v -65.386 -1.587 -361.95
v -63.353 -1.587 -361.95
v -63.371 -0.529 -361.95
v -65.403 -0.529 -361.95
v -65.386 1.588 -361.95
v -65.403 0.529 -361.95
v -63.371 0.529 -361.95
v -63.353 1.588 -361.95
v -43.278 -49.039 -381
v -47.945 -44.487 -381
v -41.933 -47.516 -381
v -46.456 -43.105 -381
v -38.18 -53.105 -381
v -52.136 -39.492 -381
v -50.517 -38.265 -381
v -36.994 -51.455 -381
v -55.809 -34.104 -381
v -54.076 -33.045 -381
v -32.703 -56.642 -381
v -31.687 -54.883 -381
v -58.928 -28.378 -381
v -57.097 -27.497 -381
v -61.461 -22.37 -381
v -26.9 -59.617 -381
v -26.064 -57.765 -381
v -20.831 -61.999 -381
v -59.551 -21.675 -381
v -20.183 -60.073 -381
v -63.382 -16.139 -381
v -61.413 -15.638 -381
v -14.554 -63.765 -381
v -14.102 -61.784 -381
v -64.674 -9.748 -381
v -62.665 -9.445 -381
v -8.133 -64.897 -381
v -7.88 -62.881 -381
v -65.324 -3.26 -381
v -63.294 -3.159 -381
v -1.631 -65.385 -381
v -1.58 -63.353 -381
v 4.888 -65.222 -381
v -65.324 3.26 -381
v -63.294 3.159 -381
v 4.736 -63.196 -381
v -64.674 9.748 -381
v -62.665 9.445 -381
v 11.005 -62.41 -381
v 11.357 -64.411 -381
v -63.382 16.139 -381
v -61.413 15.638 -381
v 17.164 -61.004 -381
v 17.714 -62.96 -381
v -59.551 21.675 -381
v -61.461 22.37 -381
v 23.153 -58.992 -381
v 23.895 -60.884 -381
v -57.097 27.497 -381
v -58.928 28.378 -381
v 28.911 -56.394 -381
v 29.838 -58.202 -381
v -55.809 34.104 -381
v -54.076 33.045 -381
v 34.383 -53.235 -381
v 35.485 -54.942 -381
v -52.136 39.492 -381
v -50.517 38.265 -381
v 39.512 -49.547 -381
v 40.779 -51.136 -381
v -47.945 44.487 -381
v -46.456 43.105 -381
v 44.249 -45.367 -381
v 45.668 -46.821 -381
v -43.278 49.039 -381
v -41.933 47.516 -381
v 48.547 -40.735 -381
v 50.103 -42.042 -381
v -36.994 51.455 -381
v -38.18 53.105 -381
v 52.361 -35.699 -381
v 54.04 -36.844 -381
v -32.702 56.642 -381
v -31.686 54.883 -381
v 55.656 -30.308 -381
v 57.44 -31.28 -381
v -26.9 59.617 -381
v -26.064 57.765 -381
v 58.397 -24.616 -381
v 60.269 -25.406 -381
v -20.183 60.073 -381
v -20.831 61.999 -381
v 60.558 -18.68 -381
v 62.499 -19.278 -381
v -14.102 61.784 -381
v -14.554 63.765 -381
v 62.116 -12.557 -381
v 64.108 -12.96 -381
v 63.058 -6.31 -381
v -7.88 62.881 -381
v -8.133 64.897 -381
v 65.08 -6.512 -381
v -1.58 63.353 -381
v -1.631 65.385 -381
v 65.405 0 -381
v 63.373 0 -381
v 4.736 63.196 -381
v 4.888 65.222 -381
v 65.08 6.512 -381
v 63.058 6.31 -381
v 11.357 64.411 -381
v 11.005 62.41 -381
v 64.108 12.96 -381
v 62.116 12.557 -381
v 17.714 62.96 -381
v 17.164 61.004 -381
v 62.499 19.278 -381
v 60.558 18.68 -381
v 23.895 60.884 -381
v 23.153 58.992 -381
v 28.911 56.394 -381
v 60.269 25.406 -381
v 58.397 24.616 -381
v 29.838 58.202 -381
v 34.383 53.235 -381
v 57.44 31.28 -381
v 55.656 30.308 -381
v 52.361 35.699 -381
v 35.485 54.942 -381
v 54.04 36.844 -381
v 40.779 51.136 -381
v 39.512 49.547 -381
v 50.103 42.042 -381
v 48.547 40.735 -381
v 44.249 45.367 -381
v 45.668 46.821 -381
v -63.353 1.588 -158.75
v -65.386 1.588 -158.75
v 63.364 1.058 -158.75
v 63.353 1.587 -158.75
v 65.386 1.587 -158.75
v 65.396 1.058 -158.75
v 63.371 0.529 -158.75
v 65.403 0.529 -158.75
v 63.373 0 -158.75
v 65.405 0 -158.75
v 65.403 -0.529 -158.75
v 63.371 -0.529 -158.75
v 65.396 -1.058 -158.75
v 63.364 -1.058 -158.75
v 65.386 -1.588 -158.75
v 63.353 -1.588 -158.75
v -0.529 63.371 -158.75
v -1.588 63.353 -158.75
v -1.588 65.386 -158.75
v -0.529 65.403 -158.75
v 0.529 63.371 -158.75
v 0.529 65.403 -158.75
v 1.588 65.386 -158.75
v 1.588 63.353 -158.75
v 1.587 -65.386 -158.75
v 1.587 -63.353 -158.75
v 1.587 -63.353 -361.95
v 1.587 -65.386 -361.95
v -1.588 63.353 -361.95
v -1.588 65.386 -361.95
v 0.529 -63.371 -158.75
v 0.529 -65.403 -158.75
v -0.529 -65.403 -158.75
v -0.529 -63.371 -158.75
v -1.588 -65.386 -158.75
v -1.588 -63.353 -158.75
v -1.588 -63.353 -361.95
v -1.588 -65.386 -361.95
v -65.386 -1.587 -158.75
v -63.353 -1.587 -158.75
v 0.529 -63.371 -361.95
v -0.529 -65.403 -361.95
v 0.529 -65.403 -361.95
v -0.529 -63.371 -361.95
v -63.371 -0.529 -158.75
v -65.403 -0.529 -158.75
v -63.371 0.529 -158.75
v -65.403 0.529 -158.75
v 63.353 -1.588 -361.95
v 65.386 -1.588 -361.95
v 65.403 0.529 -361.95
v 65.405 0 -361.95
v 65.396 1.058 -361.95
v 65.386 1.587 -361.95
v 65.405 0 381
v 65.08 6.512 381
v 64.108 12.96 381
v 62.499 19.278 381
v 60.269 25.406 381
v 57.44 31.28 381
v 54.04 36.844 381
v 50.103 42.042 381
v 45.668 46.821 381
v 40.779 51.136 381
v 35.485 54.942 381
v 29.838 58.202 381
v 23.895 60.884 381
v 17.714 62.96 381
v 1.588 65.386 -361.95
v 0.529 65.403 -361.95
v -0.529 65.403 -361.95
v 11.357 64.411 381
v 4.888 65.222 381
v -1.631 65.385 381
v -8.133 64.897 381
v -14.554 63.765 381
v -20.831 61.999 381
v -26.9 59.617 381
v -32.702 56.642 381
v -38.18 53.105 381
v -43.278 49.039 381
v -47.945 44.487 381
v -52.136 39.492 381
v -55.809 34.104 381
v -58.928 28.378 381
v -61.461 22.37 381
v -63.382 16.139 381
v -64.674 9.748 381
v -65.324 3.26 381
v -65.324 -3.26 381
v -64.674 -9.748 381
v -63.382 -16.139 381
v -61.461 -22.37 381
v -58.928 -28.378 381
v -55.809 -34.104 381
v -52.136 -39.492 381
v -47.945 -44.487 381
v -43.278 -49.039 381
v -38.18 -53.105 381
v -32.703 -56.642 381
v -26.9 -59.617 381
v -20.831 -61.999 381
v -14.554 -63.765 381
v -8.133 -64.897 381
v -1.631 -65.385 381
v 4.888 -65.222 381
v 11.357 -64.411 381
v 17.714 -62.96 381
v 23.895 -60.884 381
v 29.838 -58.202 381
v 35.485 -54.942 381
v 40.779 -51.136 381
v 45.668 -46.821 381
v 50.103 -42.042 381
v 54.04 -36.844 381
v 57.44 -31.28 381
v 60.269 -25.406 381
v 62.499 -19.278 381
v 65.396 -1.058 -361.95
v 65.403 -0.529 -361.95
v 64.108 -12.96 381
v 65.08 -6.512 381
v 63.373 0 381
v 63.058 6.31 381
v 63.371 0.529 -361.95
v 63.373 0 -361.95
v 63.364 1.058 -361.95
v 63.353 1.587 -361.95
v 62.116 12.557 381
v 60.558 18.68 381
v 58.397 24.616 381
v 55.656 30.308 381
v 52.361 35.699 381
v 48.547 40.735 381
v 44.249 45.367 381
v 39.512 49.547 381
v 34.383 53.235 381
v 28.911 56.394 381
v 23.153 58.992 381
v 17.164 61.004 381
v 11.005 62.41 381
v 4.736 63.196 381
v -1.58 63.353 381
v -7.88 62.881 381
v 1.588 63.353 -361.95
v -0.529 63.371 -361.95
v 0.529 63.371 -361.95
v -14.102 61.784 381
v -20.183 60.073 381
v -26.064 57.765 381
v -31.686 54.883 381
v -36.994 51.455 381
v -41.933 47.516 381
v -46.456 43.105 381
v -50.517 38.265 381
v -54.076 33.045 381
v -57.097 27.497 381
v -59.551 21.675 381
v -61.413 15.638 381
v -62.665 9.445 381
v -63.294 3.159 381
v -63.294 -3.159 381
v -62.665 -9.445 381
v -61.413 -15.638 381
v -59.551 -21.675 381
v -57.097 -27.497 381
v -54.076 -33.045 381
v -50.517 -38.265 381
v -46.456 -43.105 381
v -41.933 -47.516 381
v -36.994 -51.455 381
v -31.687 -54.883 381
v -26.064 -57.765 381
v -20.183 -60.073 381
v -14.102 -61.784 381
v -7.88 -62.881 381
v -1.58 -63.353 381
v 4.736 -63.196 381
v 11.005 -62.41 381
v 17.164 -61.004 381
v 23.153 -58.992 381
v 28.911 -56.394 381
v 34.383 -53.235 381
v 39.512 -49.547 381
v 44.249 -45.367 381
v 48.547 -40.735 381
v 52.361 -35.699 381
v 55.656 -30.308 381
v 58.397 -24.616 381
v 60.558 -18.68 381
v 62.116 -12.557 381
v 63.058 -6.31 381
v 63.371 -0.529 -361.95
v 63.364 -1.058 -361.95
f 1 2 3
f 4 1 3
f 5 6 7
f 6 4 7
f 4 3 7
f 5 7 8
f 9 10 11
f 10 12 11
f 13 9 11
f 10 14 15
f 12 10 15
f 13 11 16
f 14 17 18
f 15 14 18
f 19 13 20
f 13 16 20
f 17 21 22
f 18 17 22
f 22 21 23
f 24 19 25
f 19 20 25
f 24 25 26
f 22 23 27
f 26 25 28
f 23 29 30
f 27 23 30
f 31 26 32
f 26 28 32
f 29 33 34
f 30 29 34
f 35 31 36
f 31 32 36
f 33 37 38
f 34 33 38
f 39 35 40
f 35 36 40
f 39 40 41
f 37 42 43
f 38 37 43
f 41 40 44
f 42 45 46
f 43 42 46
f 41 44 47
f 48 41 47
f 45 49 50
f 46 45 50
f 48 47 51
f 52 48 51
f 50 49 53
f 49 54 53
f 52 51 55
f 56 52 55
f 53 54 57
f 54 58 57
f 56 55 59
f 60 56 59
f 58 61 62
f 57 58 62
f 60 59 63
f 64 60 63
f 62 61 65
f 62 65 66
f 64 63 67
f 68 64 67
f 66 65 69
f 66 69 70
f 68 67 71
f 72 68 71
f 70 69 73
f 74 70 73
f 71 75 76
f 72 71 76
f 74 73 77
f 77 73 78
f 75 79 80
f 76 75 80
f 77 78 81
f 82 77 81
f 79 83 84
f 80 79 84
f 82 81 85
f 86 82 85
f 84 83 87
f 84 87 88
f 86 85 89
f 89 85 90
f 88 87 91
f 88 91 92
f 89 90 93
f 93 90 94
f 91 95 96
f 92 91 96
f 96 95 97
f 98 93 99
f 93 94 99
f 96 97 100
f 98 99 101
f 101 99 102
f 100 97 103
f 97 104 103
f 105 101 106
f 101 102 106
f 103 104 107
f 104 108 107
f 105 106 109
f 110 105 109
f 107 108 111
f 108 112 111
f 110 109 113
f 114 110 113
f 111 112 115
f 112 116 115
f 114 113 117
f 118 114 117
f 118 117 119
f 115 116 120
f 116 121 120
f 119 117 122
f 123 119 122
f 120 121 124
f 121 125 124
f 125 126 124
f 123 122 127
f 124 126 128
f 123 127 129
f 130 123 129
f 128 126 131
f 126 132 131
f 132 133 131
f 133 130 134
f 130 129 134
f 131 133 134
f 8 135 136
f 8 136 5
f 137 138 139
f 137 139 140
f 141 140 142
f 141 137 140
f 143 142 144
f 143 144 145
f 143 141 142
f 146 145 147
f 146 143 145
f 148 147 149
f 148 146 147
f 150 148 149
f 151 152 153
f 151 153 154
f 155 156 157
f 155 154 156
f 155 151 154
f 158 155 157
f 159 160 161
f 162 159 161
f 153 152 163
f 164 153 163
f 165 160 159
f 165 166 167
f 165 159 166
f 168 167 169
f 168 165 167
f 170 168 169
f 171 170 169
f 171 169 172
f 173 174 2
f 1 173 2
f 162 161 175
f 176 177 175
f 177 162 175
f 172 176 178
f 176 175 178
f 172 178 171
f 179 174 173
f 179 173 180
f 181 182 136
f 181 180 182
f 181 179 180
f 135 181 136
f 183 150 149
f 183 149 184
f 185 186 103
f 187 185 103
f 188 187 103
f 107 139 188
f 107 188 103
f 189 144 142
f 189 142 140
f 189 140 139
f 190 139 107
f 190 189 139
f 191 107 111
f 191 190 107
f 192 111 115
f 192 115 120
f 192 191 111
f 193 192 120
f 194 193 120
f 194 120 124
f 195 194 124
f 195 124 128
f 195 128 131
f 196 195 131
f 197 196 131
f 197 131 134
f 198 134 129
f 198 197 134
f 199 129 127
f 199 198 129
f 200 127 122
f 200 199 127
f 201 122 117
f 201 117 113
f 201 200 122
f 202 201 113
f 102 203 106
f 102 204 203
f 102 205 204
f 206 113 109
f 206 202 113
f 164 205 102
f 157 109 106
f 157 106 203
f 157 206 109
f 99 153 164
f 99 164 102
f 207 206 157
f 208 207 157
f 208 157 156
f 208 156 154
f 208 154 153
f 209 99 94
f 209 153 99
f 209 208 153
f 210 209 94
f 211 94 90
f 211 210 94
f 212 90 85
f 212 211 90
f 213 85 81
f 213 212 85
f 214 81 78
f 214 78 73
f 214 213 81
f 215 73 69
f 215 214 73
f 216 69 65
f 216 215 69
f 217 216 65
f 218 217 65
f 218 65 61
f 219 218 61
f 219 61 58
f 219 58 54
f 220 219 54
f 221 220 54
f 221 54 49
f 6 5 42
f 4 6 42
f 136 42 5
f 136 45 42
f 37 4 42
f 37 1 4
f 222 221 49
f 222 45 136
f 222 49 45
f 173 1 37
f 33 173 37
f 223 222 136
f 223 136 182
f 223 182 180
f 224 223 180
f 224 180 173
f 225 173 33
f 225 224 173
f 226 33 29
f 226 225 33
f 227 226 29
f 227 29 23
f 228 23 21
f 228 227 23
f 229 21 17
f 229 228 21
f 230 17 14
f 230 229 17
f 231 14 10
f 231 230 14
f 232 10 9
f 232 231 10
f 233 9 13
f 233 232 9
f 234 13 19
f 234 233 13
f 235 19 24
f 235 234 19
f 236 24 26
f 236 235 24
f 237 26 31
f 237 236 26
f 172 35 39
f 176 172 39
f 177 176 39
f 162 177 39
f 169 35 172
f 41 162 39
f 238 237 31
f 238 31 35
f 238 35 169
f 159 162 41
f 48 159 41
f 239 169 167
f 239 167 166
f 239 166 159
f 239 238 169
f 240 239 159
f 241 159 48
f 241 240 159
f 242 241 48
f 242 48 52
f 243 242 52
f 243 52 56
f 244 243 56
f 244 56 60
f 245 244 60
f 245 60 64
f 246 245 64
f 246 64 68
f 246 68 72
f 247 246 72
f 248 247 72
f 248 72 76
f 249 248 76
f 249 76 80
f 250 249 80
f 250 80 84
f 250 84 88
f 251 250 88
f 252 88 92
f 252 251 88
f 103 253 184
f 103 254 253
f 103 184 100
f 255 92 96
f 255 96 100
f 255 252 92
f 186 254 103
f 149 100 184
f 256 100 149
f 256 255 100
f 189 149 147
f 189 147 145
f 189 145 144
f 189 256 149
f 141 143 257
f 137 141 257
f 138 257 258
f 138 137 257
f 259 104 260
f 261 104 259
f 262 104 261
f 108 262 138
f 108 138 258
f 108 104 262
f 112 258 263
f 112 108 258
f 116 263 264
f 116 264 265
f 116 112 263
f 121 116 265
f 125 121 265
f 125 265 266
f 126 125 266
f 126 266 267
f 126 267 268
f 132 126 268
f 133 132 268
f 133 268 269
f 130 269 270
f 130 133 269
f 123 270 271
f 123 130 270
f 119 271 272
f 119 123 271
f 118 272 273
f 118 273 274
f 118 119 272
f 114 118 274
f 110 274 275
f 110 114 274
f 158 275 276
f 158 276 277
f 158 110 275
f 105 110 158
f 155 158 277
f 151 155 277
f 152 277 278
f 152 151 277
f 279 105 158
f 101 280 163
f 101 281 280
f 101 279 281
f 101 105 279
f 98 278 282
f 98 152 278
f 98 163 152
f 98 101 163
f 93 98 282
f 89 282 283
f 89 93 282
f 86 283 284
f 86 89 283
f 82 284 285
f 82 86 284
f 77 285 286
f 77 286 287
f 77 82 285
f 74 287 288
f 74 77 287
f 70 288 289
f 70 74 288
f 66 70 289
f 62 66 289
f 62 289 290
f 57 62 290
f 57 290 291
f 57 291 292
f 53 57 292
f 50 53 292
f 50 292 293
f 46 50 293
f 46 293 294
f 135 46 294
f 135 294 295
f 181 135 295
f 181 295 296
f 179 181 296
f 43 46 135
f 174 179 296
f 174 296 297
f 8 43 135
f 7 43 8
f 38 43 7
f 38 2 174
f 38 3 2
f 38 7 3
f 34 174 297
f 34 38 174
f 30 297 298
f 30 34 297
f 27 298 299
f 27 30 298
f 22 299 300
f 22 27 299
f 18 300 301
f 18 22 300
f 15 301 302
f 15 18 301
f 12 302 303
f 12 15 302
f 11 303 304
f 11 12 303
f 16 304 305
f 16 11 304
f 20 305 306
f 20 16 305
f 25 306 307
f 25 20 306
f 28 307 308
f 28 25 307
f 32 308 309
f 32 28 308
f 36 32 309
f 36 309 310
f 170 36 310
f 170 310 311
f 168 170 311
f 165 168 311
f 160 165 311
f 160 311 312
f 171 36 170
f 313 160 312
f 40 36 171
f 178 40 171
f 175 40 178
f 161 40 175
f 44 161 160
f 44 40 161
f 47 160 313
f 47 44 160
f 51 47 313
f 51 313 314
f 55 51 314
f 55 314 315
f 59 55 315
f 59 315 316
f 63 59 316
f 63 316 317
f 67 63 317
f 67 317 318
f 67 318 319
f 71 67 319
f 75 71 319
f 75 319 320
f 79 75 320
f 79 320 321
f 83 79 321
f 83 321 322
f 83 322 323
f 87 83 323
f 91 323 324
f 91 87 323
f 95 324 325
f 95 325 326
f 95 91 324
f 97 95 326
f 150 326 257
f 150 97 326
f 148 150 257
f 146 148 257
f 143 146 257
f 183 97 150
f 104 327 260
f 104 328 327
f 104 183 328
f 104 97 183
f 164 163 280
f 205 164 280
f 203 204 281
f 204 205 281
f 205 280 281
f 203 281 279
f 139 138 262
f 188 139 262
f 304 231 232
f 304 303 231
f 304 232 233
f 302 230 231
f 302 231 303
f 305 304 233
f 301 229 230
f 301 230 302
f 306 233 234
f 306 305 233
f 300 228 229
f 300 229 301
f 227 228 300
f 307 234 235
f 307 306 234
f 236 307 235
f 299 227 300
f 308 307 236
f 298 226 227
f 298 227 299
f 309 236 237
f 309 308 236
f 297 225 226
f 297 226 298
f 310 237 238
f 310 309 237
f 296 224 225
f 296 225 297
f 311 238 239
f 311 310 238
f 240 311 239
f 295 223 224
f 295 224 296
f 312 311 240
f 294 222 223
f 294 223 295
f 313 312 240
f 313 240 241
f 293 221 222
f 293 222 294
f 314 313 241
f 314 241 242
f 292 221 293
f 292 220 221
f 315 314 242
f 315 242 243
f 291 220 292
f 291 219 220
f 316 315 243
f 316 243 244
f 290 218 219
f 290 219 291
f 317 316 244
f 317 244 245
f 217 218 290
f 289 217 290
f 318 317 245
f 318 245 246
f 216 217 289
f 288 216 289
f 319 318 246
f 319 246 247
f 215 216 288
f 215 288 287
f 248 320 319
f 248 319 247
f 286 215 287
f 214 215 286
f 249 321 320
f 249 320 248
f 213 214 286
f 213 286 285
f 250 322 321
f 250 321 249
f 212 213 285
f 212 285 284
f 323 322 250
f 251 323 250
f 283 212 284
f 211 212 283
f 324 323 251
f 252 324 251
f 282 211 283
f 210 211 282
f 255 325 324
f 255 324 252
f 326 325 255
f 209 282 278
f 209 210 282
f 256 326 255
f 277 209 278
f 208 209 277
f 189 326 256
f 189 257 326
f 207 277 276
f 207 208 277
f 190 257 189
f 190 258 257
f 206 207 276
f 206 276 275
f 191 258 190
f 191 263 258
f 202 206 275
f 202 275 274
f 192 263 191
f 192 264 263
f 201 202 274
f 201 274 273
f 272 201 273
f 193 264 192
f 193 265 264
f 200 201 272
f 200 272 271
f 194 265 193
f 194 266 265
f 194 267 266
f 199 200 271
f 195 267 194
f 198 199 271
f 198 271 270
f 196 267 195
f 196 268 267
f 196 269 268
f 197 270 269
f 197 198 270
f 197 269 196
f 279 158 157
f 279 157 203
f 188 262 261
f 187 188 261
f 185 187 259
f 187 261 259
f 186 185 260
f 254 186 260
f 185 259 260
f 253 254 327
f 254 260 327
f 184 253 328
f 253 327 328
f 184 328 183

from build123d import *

# Parameters (mm, degrees)
SKETCH1_R           = 65.405
SKETCH1_R_2         = 63.373
BOSS_EXTRUDE1_DEPTH = 381
SKETCH3_W           = 3.175
SKETCH3_H           = 203.2
CUT_EXTRUDE1_DEPTH  = 66.405
CIRPATTERN1_COUNT   = 4


with BuildPart() as part:
    # Sketch1 → Boss-Extrude1 (new body, symmetric)
    with BuildSketch(Plane.XY):
        Circle(SKETCH1_R)
        Circle(SKETCH1_R_2, mode=Mode.SUBTRACT)
    extrude(amount=BOSS_EXTRUDE1_DEPTH, both=True)

    # Sketch3 → Cut-Extrude1 (cut, through all)
    with BuildSketch(Plane(origin=(0, 0, 0), x_dir=(1, 0, 0), z_dir=(0, 1, 0))):
        with Locations((0, 260.35)):
            Rectangle(SKETCH3_W, SKETCH3_H)
    cut_extrude1 = extrude(amount=CUT_EXTRUDE1_DEPTH, mode=Mode.SUBTRACT)

    # CirPattern1: Cut-Extrude1 ×4 about axis
    cirpattern1_axis = Axis((0, 0, 0), (0, 0, 1))
    for i in range(1, CIRPATTERN1_COUNT):
        add(cut_extrude1.rotate(cirpattern1_axis, i * 360 / CIRPATTERN1_COUNT), mode=Mode.SUBTRACT)


solid = part.part
